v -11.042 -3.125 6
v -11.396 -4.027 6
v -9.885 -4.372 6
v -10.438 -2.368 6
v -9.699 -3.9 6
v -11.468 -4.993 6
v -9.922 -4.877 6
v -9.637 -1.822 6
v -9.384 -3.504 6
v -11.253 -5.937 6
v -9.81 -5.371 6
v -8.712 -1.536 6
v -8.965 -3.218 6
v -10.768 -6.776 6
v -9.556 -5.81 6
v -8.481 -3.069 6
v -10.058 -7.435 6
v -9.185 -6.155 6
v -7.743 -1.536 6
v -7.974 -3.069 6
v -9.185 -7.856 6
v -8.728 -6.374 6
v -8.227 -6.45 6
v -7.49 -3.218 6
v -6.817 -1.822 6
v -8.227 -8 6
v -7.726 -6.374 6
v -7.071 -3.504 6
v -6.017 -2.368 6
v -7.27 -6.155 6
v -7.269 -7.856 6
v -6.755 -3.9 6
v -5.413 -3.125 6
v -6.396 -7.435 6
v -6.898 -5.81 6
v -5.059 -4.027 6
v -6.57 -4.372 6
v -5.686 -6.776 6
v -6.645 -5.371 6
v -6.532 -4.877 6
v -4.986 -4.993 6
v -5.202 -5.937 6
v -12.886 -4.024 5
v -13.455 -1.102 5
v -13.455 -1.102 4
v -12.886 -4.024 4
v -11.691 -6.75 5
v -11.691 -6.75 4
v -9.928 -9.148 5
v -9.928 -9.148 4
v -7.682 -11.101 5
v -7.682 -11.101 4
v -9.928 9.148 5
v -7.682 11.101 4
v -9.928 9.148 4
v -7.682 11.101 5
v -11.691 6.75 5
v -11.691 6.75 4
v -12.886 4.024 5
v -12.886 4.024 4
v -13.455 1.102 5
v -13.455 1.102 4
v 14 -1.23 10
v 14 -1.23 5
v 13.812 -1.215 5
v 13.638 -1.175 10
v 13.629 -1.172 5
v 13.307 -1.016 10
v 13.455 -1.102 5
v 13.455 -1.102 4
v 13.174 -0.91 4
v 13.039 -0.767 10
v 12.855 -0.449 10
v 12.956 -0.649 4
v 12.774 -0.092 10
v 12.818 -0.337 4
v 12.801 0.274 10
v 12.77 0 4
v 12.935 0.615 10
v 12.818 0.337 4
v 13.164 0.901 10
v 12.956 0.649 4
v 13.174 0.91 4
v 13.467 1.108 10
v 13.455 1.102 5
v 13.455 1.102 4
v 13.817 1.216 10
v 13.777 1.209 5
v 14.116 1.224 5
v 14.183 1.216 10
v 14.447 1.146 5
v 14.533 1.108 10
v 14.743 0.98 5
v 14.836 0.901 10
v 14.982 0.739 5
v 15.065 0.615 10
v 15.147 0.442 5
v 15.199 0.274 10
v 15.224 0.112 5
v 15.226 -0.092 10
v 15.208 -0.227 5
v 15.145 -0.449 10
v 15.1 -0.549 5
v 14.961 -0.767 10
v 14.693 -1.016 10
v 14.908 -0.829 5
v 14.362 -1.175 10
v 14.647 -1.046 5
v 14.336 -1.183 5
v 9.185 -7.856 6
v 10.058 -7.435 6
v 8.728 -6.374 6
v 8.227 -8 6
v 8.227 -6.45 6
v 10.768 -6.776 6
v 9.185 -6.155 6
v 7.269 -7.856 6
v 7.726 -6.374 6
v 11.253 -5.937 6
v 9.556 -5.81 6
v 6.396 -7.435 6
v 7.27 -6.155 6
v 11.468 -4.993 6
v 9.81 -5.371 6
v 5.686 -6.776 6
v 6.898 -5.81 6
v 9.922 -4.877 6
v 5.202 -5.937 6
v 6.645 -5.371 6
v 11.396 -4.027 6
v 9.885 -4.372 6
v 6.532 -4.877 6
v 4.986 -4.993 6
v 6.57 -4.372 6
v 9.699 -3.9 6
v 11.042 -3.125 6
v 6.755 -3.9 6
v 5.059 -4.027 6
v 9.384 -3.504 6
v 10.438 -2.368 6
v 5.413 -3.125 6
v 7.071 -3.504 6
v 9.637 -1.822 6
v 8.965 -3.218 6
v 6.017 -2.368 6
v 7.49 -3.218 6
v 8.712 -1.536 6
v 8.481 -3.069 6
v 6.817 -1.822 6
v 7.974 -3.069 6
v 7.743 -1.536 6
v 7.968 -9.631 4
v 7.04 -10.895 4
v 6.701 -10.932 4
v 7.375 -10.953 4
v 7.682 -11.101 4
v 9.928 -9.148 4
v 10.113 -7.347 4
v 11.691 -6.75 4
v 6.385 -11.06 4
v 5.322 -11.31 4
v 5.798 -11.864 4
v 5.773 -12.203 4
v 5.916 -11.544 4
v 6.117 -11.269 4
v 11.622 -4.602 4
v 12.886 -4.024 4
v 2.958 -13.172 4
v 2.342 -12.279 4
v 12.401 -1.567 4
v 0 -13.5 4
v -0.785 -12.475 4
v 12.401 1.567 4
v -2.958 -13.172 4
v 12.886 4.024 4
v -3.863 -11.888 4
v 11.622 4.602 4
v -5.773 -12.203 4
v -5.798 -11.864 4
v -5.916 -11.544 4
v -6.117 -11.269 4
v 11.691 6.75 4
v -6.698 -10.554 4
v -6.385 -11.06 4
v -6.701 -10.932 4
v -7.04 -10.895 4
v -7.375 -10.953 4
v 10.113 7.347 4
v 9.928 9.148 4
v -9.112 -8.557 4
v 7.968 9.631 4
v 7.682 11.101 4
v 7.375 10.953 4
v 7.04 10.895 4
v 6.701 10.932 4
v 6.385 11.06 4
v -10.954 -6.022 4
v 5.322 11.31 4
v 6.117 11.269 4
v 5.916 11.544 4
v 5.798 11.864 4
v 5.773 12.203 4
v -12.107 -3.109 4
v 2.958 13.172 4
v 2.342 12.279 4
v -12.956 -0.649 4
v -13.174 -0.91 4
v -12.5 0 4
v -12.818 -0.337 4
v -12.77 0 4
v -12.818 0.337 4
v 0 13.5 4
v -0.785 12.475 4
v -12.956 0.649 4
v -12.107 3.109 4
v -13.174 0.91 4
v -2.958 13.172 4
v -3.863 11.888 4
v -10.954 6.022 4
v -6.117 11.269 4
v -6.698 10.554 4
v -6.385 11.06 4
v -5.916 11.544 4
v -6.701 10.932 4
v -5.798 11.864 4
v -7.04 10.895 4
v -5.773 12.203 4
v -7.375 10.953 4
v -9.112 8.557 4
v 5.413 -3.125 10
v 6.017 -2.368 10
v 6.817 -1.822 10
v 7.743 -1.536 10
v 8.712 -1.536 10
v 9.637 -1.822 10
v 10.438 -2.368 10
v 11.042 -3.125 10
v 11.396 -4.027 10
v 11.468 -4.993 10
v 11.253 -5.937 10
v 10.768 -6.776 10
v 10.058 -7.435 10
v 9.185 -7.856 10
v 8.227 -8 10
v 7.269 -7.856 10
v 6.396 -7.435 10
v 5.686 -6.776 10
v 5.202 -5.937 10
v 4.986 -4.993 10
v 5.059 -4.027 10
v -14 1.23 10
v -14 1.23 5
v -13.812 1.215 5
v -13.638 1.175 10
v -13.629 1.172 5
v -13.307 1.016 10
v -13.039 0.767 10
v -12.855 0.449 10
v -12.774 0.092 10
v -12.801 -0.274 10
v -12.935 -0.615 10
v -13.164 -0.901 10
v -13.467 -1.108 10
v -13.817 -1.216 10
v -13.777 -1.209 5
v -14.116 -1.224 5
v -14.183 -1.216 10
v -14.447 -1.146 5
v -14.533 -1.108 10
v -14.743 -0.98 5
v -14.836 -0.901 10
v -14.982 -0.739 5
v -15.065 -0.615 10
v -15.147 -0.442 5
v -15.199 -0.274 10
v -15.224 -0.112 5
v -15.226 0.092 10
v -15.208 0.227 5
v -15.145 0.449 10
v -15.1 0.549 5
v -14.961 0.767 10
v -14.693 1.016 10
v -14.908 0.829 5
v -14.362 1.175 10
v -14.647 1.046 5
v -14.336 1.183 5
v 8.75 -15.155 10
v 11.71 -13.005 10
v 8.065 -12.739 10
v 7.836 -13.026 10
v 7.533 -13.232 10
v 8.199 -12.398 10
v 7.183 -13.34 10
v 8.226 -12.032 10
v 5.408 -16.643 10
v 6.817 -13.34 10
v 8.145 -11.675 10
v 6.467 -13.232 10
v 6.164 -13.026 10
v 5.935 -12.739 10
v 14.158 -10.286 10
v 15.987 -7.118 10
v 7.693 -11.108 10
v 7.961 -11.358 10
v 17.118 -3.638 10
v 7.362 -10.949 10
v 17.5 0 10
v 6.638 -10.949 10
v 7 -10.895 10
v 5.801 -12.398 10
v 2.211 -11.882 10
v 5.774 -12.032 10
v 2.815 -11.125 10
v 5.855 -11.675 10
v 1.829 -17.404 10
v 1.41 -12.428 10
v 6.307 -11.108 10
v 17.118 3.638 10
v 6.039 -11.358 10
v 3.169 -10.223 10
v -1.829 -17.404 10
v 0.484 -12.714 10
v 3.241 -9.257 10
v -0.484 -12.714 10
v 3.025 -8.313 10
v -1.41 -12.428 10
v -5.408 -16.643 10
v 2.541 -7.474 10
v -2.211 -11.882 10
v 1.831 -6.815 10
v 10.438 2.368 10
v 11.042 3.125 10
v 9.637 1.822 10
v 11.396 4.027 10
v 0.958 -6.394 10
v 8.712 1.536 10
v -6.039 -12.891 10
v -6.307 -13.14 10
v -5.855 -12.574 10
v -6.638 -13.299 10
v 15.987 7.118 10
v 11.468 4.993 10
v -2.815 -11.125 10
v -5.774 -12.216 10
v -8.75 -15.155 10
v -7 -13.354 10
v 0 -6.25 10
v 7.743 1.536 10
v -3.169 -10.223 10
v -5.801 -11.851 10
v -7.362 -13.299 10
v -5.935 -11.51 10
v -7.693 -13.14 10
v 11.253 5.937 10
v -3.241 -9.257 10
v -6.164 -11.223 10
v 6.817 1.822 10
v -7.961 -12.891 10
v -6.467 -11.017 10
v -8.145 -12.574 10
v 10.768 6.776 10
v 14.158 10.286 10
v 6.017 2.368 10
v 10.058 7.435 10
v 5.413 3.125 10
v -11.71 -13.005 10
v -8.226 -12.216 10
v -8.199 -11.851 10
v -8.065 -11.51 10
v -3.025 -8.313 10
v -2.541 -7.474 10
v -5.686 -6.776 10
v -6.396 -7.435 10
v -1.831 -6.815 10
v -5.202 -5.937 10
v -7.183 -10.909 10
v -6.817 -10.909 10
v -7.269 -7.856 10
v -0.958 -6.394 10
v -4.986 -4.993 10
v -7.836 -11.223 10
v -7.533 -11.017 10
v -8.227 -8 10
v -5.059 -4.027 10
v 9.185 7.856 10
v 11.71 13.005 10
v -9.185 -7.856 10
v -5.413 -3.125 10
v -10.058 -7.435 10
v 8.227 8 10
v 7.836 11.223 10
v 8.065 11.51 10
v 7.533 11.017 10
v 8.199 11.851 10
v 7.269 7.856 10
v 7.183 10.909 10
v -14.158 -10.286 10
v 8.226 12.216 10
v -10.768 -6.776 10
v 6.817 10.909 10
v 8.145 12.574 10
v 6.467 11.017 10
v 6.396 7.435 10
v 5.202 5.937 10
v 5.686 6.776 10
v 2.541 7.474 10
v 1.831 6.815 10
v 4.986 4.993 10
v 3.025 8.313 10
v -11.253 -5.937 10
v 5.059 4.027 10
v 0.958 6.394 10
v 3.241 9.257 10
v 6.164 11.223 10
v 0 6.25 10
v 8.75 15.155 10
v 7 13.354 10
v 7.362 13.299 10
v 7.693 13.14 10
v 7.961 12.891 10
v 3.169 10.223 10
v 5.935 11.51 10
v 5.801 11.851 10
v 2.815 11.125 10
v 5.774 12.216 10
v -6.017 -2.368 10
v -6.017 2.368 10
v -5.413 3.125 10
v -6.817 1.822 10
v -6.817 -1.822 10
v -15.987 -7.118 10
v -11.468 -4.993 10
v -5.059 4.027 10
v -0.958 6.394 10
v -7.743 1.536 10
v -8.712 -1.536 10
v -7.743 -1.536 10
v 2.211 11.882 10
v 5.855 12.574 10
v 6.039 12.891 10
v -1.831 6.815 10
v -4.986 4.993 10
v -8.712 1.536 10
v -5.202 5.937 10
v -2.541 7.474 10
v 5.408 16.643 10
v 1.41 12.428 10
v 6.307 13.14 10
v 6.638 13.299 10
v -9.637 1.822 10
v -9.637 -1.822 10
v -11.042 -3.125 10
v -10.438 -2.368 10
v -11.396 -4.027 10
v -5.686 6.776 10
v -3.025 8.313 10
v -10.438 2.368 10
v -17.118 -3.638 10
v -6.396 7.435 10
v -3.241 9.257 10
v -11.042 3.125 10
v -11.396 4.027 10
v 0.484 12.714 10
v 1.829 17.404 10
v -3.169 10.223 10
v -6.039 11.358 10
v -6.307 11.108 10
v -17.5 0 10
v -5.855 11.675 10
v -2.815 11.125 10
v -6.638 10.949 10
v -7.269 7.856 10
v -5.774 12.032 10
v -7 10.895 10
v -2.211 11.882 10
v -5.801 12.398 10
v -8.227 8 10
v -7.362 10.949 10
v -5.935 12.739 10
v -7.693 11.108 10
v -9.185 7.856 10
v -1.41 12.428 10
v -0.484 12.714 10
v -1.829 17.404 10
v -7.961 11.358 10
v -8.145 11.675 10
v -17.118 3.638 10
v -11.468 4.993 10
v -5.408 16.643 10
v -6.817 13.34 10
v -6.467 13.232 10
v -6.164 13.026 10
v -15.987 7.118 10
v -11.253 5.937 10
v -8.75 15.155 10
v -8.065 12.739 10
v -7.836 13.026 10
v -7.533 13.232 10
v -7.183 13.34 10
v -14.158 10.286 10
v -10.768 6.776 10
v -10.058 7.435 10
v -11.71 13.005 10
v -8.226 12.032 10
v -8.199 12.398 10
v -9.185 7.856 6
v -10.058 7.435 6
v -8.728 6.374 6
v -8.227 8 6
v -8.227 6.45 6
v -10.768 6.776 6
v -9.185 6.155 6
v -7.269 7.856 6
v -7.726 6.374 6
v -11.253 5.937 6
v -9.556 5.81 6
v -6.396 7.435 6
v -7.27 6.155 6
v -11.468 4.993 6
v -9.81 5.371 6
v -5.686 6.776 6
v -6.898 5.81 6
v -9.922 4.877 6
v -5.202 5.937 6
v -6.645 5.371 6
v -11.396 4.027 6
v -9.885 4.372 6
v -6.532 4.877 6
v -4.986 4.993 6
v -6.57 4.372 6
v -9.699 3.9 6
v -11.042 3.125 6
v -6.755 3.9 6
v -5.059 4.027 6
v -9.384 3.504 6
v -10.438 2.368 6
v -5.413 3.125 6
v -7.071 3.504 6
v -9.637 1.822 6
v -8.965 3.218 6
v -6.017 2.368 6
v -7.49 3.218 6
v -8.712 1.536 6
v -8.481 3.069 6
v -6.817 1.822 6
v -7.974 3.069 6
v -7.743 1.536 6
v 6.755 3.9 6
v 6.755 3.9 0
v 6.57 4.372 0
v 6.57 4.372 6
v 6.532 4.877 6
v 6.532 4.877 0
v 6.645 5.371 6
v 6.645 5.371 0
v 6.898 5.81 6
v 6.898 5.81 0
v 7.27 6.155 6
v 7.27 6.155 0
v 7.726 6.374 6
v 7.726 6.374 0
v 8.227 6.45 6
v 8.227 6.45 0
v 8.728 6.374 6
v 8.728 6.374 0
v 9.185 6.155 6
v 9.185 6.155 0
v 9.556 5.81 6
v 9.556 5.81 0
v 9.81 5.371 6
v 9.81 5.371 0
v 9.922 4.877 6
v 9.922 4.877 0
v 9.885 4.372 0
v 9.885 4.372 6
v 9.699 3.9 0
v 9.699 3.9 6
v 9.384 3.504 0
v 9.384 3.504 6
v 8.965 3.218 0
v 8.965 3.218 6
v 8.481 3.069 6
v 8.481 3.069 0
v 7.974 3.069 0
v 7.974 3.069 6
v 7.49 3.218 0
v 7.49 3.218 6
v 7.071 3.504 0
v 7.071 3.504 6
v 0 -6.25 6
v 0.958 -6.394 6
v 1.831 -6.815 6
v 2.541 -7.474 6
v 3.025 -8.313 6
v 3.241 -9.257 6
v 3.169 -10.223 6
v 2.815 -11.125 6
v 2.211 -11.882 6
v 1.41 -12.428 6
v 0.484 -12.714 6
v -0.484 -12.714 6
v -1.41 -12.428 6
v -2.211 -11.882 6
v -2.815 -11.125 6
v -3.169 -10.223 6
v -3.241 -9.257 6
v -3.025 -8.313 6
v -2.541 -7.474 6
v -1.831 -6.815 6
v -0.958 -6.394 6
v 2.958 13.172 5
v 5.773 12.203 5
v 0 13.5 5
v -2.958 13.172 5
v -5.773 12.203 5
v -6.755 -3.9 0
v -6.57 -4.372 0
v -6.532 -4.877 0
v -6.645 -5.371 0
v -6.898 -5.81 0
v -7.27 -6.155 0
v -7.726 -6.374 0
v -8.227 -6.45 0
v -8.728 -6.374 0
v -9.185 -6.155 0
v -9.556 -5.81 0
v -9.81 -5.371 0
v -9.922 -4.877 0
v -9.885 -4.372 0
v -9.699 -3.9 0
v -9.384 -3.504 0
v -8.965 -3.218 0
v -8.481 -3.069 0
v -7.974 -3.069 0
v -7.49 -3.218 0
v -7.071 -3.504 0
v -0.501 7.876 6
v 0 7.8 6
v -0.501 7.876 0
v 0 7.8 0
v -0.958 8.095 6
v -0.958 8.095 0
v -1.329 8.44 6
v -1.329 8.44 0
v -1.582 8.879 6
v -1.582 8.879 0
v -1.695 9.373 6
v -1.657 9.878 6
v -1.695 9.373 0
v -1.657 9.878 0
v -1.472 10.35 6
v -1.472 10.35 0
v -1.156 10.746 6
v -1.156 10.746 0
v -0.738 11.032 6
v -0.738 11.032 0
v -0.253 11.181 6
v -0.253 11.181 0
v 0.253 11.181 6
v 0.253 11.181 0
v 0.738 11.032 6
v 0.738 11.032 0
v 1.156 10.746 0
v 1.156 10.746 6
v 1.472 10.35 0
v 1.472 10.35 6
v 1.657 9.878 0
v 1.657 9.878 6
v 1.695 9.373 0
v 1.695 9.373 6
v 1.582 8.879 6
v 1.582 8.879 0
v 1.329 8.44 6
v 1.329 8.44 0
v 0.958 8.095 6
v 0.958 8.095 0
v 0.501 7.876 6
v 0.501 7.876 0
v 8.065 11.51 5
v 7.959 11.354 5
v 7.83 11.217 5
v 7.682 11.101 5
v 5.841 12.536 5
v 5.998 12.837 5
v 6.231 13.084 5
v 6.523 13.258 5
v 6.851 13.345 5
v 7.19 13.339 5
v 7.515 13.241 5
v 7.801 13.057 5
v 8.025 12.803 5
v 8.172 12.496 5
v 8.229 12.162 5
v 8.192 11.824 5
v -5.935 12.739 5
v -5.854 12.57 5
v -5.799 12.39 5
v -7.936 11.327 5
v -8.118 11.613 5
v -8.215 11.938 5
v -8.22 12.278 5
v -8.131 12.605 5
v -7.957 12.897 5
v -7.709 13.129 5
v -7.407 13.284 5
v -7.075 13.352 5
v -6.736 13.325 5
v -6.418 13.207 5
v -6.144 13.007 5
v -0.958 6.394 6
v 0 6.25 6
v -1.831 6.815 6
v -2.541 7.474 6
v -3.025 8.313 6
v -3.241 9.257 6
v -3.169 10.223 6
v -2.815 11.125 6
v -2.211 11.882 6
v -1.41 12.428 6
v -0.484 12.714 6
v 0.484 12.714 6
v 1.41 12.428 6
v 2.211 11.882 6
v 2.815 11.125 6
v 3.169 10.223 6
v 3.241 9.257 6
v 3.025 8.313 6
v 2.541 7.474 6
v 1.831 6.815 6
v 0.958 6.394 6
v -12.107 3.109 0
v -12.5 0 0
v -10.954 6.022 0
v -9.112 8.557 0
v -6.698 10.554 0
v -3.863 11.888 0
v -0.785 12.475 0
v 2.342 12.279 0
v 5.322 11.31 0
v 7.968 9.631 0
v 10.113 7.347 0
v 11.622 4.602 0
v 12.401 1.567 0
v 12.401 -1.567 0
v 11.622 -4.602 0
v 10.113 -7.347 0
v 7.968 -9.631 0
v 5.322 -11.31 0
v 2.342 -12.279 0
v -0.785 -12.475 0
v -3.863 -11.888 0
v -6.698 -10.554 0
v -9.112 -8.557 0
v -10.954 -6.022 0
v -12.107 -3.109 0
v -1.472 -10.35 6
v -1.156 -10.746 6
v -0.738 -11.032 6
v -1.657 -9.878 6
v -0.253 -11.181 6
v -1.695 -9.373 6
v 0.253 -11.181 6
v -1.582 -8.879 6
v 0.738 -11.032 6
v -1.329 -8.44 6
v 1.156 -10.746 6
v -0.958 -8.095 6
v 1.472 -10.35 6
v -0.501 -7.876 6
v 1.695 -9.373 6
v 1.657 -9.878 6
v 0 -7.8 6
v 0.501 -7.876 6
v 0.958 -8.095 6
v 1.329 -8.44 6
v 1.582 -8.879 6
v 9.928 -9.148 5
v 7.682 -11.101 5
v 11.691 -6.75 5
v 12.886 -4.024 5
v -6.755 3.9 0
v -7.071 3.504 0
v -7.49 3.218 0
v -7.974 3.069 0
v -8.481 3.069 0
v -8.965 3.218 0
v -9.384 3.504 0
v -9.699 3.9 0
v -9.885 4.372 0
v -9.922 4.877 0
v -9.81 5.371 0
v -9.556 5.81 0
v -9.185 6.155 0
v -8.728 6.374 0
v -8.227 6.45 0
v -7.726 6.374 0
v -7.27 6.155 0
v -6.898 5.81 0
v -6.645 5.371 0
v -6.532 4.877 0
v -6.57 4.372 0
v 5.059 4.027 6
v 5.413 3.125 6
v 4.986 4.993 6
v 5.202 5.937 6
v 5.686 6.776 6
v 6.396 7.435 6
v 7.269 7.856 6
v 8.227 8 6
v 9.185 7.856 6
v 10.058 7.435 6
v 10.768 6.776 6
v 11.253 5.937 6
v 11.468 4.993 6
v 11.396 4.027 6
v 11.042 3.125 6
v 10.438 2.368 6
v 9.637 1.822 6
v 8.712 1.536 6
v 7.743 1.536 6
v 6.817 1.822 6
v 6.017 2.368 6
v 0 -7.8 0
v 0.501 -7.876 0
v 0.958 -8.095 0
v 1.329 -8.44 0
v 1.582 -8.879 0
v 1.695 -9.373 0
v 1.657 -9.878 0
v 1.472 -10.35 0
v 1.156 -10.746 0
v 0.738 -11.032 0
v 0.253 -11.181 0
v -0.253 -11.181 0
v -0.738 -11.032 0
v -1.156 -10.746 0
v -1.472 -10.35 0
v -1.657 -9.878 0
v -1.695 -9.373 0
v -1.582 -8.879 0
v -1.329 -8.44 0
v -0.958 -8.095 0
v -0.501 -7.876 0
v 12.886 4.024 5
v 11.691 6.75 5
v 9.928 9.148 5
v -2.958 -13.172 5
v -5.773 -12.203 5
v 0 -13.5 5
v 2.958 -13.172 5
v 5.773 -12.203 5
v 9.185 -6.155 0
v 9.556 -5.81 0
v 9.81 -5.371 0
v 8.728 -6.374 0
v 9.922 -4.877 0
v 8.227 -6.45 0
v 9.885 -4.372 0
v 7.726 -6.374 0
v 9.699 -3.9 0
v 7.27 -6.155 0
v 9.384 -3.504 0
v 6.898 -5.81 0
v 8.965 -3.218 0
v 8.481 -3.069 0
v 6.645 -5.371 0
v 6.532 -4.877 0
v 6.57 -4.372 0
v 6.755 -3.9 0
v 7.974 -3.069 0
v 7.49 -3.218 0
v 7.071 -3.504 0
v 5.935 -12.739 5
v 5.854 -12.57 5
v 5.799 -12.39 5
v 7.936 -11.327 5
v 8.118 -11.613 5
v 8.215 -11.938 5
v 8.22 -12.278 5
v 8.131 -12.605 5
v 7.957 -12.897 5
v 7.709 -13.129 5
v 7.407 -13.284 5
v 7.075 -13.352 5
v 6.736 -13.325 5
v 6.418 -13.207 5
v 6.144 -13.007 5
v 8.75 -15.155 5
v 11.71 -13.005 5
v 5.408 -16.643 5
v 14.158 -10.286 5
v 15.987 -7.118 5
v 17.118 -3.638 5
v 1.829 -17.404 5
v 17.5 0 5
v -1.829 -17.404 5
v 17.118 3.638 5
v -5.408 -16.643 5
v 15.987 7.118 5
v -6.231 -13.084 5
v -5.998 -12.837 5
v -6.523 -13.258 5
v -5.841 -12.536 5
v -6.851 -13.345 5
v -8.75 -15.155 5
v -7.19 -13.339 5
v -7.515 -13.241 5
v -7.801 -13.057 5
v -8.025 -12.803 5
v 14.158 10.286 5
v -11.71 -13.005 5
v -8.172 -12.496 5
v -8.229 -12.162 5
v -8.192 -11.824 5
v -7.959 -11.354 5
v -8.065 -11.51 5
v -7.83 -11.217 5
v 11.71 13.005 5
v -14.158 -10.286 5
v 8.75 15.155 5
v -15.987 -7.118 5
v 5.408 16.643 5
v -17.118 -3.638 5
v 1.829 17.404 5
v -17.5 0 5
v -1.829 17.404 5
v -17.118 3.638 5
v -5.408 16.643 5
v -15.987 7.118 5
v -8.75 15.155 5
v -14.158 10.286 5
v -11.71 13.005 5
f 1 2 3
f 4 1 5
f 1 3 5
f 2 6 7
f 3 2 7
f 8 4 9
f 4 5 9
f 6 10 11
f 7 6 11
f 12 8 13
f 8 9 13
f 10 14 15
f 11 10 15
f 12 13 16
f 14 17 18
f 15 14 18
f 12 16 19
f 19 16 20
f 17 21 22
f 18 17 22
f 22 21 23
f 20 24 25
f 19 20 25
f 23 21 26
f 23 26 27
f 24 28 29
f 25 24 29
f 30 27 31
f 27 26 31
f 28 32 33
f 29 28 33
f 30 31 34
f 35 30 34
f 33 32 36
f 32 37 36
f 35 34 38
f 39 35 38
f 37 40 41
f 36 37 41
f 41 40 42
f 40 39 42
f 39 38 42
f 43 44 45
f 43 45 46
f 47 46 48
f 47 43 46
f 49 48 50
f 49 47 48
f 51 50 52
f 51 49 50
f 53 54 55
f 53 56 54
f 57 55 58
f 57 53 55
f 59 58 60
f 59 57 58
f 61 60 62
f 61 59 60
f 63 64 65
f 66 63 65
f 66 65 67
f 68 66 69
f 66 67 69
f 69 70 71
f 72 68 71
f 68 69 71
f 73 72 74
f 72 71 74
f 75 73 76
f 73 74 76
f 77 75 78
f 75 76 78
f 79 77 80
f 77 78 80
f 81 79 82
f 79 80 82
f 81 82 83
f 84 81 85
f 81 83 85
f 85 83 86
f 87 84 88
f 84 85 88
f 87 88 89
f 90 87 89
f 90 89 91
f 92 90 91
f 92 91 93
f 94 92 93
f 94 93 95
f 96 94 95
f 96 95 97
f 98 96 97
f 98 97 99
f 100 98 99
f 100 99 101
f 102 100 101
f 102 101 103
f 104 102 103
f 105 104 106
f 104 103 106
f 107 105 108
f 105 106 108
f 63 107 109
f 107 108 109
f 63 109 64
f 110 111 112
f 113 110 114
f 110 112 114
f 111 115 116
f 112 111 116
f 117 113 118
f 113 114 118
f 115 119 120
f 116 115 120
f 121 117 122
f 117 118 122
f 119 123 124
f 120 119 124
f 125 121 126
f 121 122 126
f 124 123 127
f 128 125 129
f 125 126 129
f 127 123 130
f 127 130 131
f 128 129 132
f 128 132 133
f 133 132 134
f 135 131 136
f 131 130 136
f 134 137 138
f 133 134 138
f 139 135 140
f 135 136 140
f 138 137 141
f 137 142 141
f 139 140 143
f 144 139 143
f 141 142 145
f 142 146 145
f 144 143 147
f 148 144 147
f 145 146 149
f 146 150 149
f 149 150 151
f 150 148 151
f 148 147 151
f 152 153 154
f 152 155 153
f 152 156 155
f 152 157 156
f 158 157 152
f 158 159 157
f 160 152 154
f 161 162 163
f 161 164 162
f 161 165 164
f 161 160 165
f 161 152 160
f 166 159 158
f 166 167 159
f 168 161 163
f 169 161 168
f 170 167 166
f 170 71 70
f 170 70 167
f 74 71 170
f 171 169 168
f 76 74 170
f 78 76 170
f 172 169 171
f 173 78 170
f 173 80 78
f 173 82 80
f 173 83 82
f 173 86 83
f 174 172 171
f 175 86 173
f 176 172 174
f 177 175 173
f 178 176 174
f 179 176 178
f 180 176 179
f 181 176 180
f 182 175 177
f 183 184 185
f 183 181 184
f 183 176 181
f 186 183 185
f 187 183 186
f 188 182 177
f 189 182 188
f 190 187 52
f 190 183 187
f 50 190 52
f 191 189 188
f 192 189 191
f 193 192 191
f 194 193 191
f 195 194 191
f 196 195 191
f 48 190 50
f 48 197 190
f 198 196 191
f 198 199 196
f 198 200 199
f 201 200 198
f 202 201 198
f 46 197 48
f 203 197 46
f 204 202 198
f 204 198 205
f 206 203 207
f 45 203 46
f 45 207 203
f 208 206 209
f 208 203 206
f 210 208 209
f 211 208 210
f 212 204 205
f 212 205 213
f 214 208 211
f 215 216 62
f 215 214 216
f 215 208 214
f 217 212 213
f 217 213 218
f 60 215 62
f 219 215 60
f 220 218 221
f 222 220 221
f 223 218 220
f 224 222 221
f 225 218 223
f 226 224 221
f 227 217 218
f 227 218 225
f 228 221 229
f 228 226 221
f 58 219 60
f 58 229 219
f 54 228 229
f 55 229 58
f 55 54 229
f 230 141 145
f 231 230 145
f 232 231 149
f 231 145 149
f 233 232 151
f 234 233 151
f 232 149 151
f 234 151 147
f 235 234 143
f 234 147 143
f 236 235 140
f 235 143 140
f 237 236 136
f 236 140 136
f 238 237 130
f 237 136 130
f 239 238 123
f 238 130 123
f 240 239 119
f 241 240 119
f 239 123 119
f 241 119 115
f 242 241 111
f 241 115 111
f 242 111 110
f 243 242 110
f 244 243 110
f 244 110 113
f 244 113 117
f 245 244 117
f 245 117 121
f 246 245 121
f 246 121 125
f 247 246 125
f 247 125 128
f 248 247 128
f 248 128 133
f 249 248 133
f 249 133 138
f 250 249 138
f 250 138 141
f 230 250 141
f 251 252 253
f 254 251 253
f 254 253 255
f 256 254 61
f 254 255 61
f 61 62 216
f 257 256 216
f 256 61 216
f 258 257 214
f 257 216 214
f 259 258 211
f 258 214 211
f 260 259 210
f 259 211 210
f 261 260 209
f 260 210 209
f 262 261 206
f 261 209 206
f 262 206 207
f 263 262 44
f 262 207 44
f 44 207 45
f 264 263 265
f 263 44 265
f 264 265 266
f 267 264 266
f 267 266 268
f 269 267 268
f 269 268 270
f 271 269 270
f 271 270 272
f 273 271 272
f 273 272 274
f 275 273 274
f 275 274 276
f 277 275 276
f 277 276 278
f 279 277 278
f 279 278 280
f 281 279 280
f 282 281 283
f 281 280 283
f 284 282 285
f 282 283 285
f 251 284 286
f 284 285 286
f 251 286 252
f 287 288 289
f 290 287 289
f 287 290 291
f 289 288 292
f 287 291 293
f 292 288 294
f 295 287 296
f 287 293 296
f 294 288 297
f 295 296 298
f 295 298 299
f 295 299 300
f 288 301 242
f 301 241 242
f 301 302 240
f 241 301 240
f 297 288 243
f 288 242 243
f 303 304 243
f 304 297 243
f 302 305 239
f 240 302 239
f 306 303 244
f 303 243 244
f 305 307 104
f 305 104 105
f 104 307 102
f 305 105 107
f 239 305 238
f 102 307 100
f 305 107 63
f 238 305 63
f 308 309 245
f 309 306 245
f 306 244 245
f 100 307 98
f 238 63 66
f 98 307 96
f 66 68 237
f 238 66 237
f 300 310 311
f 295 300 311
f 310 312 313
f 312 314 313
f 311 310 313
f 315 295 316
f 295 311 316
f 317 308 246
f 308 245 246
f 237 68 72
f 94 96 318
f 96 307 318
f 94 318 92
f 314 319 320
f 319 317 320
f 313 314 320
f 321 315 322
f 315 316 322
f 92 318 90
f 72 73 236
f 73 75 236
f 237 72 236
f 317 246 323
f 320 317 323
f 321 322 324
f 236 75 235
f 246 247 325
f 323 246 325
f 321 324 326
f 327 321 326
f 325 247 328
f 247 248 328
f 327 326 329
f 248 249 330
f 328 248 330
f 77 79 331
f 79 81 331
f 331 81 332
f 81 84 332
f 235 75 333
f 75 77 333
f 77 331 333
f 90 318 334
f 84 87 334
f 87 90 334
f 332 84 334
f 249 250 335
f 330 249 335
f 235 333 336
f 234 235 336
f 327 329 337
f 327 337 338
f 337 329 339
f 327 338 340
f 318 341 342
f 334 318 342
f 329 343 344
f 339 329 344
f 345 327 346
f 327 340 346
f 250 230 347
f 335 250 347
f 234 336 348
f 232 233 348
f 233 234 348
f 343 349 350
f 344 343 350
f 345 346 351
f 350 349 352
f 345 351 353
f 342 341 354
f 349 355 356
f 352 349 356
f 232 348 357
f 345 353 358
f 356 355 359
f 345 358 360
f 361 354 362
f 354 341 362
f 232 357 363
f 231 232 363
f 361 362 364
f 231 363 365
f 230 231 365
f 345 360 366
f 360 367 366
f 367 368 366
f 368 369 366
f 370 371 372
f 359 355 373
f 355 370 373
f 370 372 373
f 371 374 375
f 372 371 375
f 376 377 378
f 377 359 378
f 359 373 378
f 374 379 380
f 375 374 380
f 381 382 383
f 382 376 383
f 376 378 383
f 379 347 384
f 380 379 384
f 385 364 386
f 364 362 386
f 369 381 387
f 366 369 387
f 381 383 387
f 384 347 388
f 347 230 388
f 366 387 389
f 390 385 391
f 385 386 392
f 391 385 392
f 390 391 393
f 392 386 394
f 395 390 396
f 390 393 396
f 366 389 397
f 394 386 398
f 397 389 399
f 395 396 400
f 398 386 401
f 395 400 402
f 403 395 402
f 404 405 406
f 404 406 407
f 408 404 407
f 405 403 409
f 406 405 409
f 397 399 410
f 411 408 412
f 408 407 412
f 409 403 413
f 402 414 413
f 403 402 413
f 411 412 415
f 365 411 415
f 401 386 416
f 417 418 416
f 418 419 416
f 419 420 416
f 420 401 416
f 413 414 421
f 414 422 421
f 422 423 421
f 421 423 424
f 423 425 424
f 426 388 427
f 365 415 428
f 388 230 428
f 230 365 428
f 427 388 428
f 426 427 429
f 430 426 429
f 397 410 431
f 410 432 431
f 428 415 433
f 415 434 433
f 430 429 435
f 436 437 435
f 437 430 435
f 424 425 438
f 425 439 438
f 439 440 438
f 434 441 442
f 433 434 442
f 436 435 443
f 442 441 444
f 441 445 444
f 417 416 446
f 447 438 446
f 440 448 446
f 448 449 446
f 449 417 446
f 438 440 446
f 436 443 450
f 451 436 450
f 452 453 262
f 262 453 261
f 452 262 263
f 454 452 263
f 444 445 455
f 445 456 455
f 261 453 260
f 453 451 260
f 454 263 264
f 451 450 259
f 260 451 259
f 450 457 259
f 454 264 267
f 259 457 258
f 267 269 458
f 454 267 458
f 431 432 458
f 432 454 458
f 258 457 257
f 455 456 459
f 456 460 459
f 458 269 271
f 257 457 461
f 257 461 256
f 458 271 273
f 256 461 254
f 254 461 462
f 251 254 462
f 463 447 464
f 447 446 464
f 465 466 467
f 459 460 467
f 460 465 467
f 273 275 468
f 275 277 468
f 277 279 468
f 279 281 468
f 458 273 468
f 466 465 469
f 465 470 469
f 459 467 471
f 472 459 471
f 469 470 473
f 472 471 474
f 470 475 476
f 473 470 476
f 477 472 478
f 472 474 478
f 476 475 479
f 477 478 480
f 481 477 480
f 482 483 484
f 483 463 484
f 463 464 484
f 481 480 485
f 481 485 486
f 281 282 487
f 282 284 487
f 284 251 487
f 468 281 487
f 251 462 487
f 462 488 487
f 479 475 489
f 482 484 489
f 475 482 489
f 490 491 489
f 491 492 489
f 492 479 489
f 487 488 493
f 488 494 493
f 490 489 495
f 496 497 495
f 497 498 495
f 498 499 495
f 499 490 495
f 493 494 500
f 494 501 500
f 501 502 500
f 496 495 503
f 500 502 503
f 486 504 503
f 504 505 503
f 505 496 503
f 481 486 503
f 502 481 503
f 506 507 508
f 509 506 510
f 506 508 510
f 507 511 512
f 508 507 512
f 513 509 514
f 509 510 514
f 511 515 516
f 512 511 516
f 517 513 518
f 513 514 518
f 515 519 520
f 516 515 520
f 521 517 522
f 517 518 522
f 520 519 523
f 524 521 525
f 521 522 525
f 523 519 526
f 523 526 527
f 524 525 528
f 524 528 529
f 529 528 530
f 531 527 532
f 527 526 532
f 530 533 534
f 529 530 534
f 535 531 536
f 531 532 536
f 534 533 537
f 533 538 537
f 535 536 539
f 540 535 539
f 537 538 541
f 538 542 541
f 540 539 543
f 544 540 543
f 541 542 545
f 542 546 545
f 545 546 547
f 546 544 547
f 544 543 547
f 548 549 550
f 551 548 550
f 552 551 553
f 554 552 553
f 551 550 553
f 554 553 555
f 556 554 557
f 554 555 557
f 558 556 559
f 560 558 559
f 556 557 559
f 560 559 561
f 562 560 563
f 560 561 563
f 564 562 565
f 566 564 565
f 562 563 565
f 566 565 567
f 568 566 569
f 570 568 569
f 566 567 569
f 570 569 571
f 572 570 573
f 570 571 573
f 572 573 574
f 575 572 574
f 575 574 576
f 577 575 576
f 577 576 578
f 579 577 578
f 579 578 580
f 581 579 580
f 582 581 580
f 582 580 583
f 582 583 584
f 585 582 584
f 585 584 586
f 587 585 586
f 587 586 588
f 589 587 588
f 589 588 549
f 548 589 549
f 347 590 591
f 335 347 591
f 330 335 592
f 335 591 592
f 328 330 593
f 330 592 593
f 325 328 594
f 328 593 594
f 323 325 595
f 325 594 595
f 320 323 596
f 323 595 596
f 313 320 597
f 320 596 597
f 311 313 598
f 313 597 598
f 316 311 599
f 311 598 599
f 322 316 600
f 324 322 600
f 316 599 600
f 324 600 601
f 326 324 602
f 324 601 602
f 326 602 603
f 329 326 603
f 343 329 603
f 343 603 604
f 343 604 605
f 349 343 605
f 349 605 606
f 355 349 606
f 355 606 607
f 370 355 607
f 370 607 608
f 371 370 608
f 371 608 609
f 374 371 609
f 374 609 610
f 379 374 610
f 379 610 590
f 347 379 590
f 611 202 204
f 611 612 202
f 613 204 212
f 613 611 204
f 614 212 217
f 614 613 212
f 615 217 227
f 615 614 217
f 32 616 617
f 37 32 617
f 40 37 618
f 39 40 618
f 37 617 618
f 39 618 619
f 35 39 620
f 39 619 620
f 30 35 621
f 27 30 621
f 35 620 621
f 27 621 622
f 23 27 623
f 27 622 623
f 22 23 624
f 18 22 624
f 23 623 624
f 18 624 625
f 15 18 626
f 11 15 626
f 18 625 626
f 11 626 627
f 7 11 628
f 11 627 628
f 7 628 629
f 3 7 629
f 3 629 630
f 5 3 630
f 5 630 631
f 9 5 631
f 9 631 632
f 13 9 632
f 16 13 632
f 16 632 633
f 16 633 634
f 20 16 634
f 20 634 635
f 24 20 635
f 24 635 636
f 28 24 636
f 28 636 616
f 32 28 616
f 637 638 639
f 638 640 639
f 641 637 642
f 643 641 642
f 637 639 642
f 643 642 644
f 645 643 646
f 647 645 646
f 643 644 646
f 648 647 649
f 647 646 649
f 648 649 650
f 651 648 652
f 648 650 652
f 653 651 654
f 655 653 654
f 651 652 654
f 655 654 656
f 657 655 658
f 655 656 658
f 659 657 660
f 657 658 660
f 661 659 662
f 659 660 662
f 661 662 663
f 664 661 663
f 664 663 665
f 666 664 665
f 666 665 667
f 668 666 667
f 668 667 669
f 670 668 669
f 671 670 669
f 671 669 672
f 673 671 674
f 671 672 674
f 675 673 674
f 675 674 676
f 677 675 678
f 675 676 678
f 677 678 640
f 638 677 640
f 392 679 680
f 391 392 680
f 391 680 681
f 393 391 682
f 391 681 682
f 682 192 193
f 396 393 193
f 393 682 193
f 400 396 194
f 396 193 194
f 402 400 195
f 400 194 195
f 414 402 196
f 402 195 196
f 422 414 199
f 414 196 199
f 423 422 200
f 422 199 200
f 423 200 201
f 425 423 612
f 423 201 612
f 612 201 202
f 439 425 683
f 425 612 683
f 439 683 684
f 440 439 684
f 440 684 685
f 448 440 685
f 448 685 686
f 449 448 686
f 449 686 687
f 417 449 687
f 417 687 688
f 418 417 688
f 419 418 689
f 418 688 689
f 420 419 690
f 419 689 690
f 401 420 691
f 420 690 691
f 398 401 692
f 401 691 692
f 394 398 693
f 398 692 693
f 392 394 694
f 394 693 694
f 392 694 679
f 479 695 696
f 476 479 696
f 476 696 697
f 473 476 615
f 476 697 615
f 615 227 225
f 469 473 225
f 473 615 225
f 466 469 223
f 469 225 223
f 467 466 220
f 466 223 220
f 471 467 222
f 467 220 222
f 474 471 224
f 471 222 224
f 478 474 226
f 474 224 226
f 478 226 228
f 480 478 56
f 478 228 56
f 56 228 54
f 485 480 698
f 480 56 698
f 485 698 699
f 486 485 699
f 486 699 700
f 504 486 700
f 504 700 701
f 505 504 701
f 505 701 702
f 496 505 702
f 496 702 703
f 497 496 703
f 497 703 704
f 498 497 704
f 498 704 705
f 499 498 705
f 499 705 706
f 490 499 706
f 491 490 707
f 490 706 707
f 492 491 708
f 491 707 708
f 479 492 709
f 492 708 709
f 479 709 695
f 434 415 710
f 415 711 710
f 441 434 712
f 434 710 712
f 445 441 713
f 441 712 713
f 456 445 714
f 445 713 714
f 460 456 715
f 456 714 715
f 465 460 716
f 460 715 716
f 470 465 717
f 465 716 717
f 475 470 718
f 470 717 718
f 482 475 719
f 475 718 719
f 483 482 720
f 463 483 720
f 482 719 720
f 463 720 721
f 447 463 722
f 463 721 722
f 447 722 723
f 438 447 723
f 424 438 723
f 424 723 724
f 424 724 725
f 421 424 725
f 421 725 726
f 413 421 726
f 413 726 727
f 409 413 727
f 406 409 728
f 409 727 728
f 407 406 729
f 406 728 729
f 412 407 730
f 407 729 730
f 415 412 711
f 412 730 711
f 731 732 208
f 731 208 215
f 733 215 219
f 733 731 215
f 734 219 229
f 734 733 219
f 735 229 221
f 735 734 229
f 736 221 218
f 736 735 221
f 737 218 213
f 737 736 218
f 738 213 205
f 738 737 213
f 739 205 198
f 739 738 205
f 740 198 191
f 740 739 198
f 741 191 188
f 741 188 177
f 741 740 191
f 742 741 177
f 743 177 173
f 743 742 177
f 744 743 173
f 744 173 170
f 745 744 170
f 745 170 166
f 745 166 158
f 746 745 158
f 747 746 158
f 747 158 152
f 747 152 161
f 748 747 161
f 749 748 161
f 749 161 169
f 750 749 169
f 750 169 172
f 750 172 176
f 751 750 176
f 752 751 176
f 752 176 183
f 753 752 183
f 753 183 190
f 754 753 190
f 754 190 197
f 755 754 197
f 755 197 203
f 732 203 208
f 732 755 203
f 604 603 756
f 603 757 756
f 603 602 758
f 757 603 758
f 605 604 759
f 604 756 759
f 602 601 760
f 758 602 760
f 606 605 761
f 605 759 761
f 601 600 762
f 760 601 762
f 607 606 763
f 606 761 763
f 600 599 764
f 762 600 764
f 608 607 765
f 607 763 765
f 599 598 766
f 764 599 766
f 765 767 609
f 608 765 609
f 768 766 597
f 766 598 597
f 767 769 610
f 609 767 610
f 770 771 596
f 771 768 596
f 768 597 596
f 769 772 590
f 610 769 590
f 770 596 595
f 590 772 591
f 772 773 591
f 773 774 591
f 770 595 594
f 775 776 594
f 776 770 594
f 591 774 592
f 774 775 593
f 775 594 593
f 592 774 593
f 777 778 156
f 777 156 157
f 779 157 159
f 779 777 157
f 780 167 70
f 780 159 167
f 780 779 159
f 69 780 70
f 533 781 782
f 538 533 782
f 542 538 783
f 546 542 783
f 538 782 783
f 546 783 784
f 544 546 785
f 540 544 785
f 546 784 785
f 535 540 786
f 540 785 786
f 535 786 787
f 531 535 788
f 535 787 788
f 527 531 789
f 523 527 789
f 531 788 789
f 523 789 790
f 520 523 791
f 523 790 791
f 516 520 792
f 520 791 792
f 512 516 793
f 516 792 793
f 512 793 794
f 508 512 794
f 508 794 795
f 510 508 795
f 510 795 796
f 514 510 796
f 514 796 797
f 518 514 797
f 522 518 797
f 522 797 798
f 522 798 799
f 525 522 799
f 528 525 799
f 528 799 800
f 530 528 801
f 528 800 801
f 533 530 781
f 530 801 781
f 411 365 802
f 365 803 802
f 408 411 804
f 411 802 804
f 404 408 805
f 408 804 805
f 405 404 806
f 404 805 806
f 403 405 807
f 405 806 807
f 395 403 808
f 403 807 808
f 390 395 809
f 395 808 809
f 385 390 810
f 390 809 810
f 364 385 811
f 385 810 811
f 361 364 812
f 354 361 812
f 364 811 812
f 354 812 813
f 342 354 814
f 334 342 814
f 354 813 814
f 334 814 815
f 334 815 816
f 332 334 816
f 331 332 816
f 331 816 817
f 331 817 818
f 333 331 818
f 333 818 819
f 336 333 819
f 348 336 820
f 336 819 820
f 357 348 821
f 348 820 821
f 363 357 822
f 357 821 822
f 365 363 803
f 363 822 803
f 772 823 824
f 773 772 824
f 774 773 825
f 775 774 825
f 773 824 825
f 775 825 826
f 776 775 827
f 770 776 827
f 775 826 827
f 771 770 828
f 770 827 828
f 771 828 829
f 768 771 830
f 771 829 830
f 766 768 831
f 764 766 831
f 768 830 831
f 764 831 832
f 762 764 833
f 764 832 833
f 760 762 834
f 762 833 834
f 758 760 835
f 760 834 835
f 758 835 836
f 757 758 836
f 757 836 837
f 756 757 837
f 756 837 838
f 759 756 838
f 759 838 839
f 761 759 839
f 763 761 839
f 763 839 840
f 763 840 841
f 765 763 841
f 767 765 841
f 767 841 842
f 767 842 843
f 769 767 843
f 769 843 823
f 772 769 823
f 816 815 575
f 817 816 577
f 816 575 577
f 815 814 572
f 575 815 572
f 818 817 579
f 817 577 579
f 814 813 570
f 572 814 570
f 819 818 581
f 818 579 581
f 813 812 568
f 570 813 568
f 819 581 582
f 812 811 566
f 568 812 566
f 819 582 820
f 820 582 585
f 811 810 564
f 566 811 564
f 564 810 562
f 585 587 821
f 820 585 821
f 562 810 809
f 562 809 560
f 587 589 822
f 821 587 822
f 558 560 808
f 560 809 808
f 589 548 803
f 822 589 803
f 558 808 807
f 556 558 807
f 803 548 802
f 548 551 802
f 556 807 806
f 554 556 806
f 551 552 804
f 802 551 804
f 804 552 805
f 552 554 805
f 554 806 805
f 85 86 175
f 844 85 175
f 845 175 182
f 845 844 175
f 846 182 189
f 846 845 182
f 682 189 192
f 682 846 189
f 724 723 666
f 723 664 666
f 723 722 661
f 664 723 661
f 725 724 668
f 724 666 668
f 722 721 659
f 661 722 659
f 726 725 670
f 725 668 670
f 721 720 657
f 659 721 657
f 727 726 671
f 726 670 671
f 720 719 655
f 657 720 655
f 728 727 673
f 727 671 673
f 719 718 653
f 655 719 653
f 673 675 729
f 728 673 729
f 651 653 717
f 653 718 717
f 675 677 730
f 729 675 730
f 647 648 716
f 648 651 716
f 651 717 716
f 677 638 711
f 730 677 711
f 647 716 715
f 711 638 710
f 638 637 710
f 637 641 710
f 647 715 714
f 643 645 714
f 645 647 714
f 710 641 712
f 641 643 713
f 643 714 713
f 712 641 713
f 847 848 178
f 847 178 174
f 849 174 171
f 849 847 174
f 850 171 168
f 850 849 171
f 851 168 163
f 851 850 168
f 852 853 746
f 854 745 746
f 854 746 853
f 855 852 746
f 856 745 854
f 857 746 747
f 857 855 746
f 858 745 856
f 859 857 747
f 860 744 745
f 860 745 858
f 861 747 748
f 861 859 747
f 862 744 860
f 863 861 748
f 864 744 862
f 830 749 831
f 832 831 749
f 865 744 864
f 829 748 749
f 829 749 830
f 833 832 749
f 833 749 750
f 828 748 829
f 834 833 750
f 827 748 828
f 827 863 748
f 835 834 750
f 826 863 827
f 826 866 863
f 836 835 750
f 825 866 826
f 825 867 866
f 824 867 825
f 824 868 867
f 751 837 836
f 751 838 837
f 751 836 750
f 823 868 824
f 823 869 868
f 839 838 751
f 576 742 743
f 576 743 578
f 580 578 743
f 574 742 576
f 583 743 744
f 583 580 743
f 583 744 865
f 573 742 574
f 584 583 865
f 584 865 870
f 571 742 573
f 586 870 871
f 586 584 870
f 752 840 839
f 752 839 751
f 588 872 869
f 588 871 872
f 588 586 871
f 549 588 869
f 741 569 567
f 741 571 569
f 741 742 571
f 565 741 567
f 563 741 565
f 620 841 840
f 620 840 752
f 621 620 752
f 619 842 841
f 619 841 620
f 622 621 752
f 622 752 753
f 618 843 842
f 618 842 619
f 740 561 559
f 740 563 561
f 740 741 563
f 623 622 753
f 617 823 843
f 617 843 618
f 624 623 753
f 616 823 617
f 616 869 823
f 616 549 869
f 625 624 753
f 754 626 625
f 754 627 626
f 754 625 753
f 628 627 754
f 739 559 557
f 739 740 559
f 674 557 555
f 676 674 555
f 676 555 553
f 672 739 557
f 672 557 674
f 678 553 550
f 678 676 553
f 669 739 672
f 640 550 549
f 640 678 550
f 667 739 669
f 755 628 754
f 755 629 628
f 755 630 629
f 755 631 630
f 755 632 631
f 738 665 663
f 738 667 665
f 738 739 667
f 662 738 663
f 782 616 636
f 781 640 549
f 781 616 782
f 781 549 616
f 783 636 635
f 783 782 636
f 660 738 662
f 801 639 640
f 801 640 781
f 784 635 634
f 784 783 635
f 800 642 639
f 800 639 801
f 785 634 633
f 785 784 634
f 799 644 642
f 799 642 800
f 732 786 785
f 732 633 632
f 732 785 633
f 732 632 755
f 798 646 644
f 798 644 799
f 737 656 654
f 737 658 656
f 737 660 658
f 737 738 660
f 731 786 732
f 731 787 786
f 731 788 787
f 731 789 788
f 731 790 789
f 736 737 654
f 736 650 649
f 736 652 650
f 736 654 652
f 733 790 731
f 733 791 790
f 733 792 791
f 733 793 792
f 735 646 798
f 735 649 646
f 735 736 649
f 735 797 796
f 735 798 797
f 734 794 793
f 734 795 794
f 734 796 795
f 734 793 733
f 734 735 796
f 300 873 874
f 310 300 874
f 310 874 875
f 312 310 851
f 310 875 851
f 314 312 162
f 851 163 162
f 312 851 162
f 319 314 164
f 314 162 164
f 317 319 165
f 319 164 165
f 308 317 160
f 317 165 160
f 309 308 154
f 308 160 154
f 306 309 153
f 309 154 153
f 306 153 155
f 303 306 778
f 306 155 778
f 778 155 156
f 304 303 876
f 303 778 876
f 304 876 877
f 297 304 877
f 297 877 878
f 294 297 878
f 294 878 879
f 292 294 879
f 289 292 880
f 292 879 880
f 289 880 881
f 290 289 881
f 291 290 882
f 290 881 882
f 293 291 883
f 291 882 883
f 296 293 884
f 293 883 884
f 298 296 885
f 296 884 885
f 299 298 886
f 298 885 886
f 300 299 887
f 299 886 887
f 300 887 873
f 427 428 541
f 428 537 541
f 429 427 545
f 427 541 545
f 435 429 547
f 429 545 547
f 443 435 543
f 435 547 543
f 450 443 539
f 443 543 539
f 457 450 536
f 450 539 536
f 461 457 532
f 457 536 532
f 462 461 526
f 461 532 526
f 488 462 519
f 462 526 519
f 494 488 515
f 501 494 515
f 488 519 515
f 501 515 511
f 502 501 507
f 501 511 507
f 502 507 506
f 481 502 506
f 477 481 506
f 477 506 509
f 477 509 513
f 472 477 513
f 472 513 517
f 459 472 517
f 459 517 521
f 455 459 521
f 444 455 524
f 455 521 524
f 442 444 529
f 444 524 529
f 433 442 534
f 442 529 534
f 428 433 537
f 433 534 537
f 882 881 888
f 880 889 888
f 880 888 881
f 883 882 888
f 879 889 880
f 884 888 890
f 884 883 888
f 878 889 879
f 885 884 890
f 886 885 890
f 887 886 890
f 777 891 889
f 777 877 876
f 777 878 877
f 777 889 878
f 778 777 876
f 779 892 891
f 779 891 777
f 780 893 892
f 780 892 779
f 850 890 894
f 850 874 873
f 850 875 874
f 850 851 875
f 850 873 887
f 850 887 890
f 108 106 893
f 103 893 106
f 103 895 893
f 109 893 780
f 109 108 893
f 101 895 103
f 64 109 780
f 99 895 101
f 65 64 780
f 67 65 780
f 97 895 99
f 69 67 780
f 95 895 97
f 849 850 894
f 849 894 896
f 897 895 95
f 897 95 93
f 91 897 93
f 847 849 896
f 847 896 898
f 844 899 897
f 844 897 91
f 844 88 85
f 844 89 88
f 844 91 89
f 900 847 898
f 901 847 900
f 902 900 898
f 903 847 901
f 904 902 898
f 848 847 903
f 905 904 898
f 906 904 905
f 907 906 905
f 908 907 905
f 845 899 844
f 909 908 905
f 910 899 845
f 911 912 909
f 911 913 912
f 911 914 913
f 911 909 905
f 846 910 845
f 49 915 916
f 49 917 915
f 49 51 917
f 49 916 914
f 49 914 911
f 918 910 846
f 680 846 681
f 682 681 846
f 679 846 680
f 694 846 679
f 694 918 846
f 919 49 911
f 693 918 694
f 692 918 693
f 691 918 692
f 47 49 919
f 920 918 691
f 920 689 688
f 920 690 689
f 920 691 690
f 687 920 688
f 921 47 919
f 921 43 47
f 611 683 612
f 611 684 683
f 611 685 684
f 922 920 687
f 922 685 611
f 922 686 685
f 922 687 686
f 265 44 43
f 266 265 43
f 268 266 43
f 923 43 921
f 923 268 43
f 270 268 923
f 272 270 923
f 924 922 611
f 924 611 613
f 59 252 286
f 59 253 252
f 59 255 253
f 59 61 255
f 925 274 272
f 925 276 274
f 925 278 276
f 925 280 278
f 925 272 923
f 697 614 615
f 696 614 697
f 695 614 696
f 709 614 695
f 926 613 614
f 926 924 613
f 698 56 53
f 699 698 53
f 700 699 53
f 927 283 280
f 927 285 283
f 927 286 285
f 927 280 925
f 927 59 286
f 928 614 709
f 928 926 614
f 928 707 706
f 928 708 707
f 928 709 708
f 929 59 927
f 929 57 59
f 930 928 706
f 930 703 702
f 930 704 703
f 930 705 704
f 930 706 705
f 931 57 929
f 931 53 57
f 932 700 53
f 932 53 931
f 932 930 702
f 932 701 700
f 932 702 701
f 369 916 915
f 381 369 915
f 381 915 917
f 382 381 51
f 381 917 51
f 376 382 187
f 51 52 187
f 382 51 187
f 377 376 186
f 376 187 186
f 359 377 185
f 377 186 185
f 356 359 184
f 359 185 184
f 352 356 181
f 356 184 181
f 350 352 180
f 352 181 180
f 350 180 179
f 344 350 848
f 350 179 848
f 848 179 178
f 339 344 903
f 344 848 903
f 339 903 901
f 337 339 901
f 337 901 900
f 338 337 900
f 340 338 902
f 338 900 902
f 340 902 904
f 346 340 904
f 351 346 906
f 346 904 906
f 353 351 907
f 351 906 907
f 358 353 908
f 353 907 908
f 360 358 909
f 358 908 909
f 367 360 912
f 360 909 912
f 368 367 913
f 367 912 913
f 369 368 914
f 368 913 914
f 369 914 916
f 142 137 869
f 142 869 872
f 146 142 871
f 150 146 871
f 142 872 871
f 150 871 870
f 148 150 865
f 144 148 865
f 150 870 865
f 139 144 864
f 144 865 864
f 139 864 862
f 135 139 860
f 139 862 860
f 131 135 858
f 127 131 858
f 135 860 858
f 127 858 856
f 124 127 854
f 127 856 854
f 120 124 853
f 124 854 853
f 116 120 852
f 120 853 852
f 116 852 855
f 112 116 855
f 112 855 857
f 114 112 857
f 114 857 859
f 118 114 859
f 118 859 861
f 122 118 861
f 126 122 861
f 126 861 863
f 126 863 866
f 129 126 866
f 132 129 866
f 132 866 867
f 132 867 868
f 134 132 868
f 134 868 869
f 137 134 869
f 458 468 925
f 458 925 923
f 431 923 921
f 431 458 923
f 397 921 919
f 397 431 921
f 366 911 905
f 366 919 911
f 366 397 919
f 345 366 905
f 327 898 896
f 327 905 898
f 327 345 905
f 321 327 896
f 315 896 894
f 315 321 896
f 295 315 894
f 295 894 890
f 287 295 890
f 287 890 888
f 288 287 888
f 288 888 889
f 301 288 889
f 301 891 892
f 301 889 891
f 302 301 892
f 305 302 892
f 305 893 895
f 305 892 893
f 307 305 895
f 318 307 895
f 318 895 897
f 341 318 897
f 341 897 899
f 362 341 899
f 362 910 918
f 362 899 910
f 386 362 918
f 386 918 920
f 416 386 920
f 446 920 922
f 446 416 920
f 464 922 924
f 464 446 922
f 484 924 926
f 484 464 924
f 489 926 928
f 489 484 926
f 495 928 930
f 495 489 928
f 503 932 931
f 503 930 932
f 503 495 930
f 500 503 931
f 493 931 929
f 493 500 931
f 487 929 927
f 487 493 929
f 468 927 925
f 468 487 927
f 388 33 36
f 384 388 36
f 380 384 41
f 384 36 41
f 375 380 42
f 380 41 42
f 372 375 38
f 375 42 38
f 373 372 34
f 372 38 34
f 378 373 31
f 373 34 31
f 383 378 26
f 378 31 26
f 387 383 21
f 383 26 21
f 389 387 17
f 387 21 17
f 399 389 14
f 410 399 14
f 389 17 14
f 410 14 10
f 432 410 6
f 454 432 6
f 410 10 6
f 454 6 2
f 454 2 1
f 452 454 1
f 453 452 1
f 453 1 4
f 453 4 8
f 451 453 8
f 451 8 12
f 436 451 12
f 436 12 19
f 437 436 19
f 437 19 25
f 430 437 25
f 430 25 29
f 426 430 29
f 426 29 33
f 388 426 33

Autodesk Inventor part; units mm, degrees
ref_plane "YZ Plane" through (0, 0, 0) normal (1, 0, 0) x (0, 1, 0)
ref_plane "XZ Plane" through (0, 0, 0) normal (0, 1, 0) x (-1, 0, 0)
ref_plane "XY Plane" through (0, 0, 0) normal (0, 0, 1) x (1, 0, 0)
sketch "Sketch1" plane through (0, 0, 0) normal (0, 1, 0) x (-1, 0, 0)
  line L0 (13.5, 4) -> (13.5, 5)
  line L1 (13.5, 5) -> (17.5, 5)
  line L2 (17.5, 5) -> (17.5, 10)
  line L3 (17.5, 10) -> (0, 10)
  line L4 (0, 10) -> (0, 0)
  line L5 (13.5, 4) -> (12.5, 4)
  line L6 (12.5, 4) -> (12.5, 0)
  line L7 (12.5, 0) -> (0, 0)
  dimension "d1" = 27
  dimension "d2" = 35
  dimension "d3" = 1
  dimension "d4" = 5
  dimension "d28" = 25
  dimension "d29" = 4
revolve "Revolution1" add sketch "Sketch1" angle 360 about axis through (0, 0, 10) along (0, 0, -1)
sketch "Sketch2" plane through (0, 0, 10) normal (0, 0, 1) x (1, 0, 0)
  point P0 (0, 0)
  point P1 (0, 9.5)
  dimension "d6" = 9.5
hole "Hole1" at (0, 9.5, 10) direction (0, 0, -1) diameter 3.4 end through all counterbore diameter 6.5 counterbore depth 4 clearance for "Socket Head Cap Screw DIN EN ISO 4762" size "M3" standard "DIN"
pattern_circular "Circular Pattern1" count 6 over 360 about axis through (0, 0, -10) along (0, 0, -1) of "Hole1"
sketch "Sketch3" plane through (0, 0, 10) normal (0, 0, 1) x (1, 0, 0)
  point P0 (0, 0)
  point P1 (14, 0)
  dimension "d17" = 14
hole "Hole2" at (14, 0, 10) direction (0, 0, -1) diameter 2.459 end through all thread size "M3x0.5" class "6H" standard "ISO Metric profile"
pattern_circular "Circular Pattern2" count 6 over 360 about axis through (0, 0, -10) along (0, 0, 1) of "Hole2"
equation "\"d28\" = bearing_61705_inner"
equation "\"bearing_61807_inner\" = 35"
equation "\"bearing_61807_outer\" = 47.1"
equation "\"bearing_61814_outer\" = 90.1"
equation "\"bearing_61705_outer\" = 32.1"
equation "\"bearing_61705_inner\" = 25"
equation "\"M3_adjustable\" = 3.2"
equation "\"bearing_606_outer\" = 17.1"
equation "\"gearbox_35_outer\" = 32.3"
properties part number "405-output disk"
